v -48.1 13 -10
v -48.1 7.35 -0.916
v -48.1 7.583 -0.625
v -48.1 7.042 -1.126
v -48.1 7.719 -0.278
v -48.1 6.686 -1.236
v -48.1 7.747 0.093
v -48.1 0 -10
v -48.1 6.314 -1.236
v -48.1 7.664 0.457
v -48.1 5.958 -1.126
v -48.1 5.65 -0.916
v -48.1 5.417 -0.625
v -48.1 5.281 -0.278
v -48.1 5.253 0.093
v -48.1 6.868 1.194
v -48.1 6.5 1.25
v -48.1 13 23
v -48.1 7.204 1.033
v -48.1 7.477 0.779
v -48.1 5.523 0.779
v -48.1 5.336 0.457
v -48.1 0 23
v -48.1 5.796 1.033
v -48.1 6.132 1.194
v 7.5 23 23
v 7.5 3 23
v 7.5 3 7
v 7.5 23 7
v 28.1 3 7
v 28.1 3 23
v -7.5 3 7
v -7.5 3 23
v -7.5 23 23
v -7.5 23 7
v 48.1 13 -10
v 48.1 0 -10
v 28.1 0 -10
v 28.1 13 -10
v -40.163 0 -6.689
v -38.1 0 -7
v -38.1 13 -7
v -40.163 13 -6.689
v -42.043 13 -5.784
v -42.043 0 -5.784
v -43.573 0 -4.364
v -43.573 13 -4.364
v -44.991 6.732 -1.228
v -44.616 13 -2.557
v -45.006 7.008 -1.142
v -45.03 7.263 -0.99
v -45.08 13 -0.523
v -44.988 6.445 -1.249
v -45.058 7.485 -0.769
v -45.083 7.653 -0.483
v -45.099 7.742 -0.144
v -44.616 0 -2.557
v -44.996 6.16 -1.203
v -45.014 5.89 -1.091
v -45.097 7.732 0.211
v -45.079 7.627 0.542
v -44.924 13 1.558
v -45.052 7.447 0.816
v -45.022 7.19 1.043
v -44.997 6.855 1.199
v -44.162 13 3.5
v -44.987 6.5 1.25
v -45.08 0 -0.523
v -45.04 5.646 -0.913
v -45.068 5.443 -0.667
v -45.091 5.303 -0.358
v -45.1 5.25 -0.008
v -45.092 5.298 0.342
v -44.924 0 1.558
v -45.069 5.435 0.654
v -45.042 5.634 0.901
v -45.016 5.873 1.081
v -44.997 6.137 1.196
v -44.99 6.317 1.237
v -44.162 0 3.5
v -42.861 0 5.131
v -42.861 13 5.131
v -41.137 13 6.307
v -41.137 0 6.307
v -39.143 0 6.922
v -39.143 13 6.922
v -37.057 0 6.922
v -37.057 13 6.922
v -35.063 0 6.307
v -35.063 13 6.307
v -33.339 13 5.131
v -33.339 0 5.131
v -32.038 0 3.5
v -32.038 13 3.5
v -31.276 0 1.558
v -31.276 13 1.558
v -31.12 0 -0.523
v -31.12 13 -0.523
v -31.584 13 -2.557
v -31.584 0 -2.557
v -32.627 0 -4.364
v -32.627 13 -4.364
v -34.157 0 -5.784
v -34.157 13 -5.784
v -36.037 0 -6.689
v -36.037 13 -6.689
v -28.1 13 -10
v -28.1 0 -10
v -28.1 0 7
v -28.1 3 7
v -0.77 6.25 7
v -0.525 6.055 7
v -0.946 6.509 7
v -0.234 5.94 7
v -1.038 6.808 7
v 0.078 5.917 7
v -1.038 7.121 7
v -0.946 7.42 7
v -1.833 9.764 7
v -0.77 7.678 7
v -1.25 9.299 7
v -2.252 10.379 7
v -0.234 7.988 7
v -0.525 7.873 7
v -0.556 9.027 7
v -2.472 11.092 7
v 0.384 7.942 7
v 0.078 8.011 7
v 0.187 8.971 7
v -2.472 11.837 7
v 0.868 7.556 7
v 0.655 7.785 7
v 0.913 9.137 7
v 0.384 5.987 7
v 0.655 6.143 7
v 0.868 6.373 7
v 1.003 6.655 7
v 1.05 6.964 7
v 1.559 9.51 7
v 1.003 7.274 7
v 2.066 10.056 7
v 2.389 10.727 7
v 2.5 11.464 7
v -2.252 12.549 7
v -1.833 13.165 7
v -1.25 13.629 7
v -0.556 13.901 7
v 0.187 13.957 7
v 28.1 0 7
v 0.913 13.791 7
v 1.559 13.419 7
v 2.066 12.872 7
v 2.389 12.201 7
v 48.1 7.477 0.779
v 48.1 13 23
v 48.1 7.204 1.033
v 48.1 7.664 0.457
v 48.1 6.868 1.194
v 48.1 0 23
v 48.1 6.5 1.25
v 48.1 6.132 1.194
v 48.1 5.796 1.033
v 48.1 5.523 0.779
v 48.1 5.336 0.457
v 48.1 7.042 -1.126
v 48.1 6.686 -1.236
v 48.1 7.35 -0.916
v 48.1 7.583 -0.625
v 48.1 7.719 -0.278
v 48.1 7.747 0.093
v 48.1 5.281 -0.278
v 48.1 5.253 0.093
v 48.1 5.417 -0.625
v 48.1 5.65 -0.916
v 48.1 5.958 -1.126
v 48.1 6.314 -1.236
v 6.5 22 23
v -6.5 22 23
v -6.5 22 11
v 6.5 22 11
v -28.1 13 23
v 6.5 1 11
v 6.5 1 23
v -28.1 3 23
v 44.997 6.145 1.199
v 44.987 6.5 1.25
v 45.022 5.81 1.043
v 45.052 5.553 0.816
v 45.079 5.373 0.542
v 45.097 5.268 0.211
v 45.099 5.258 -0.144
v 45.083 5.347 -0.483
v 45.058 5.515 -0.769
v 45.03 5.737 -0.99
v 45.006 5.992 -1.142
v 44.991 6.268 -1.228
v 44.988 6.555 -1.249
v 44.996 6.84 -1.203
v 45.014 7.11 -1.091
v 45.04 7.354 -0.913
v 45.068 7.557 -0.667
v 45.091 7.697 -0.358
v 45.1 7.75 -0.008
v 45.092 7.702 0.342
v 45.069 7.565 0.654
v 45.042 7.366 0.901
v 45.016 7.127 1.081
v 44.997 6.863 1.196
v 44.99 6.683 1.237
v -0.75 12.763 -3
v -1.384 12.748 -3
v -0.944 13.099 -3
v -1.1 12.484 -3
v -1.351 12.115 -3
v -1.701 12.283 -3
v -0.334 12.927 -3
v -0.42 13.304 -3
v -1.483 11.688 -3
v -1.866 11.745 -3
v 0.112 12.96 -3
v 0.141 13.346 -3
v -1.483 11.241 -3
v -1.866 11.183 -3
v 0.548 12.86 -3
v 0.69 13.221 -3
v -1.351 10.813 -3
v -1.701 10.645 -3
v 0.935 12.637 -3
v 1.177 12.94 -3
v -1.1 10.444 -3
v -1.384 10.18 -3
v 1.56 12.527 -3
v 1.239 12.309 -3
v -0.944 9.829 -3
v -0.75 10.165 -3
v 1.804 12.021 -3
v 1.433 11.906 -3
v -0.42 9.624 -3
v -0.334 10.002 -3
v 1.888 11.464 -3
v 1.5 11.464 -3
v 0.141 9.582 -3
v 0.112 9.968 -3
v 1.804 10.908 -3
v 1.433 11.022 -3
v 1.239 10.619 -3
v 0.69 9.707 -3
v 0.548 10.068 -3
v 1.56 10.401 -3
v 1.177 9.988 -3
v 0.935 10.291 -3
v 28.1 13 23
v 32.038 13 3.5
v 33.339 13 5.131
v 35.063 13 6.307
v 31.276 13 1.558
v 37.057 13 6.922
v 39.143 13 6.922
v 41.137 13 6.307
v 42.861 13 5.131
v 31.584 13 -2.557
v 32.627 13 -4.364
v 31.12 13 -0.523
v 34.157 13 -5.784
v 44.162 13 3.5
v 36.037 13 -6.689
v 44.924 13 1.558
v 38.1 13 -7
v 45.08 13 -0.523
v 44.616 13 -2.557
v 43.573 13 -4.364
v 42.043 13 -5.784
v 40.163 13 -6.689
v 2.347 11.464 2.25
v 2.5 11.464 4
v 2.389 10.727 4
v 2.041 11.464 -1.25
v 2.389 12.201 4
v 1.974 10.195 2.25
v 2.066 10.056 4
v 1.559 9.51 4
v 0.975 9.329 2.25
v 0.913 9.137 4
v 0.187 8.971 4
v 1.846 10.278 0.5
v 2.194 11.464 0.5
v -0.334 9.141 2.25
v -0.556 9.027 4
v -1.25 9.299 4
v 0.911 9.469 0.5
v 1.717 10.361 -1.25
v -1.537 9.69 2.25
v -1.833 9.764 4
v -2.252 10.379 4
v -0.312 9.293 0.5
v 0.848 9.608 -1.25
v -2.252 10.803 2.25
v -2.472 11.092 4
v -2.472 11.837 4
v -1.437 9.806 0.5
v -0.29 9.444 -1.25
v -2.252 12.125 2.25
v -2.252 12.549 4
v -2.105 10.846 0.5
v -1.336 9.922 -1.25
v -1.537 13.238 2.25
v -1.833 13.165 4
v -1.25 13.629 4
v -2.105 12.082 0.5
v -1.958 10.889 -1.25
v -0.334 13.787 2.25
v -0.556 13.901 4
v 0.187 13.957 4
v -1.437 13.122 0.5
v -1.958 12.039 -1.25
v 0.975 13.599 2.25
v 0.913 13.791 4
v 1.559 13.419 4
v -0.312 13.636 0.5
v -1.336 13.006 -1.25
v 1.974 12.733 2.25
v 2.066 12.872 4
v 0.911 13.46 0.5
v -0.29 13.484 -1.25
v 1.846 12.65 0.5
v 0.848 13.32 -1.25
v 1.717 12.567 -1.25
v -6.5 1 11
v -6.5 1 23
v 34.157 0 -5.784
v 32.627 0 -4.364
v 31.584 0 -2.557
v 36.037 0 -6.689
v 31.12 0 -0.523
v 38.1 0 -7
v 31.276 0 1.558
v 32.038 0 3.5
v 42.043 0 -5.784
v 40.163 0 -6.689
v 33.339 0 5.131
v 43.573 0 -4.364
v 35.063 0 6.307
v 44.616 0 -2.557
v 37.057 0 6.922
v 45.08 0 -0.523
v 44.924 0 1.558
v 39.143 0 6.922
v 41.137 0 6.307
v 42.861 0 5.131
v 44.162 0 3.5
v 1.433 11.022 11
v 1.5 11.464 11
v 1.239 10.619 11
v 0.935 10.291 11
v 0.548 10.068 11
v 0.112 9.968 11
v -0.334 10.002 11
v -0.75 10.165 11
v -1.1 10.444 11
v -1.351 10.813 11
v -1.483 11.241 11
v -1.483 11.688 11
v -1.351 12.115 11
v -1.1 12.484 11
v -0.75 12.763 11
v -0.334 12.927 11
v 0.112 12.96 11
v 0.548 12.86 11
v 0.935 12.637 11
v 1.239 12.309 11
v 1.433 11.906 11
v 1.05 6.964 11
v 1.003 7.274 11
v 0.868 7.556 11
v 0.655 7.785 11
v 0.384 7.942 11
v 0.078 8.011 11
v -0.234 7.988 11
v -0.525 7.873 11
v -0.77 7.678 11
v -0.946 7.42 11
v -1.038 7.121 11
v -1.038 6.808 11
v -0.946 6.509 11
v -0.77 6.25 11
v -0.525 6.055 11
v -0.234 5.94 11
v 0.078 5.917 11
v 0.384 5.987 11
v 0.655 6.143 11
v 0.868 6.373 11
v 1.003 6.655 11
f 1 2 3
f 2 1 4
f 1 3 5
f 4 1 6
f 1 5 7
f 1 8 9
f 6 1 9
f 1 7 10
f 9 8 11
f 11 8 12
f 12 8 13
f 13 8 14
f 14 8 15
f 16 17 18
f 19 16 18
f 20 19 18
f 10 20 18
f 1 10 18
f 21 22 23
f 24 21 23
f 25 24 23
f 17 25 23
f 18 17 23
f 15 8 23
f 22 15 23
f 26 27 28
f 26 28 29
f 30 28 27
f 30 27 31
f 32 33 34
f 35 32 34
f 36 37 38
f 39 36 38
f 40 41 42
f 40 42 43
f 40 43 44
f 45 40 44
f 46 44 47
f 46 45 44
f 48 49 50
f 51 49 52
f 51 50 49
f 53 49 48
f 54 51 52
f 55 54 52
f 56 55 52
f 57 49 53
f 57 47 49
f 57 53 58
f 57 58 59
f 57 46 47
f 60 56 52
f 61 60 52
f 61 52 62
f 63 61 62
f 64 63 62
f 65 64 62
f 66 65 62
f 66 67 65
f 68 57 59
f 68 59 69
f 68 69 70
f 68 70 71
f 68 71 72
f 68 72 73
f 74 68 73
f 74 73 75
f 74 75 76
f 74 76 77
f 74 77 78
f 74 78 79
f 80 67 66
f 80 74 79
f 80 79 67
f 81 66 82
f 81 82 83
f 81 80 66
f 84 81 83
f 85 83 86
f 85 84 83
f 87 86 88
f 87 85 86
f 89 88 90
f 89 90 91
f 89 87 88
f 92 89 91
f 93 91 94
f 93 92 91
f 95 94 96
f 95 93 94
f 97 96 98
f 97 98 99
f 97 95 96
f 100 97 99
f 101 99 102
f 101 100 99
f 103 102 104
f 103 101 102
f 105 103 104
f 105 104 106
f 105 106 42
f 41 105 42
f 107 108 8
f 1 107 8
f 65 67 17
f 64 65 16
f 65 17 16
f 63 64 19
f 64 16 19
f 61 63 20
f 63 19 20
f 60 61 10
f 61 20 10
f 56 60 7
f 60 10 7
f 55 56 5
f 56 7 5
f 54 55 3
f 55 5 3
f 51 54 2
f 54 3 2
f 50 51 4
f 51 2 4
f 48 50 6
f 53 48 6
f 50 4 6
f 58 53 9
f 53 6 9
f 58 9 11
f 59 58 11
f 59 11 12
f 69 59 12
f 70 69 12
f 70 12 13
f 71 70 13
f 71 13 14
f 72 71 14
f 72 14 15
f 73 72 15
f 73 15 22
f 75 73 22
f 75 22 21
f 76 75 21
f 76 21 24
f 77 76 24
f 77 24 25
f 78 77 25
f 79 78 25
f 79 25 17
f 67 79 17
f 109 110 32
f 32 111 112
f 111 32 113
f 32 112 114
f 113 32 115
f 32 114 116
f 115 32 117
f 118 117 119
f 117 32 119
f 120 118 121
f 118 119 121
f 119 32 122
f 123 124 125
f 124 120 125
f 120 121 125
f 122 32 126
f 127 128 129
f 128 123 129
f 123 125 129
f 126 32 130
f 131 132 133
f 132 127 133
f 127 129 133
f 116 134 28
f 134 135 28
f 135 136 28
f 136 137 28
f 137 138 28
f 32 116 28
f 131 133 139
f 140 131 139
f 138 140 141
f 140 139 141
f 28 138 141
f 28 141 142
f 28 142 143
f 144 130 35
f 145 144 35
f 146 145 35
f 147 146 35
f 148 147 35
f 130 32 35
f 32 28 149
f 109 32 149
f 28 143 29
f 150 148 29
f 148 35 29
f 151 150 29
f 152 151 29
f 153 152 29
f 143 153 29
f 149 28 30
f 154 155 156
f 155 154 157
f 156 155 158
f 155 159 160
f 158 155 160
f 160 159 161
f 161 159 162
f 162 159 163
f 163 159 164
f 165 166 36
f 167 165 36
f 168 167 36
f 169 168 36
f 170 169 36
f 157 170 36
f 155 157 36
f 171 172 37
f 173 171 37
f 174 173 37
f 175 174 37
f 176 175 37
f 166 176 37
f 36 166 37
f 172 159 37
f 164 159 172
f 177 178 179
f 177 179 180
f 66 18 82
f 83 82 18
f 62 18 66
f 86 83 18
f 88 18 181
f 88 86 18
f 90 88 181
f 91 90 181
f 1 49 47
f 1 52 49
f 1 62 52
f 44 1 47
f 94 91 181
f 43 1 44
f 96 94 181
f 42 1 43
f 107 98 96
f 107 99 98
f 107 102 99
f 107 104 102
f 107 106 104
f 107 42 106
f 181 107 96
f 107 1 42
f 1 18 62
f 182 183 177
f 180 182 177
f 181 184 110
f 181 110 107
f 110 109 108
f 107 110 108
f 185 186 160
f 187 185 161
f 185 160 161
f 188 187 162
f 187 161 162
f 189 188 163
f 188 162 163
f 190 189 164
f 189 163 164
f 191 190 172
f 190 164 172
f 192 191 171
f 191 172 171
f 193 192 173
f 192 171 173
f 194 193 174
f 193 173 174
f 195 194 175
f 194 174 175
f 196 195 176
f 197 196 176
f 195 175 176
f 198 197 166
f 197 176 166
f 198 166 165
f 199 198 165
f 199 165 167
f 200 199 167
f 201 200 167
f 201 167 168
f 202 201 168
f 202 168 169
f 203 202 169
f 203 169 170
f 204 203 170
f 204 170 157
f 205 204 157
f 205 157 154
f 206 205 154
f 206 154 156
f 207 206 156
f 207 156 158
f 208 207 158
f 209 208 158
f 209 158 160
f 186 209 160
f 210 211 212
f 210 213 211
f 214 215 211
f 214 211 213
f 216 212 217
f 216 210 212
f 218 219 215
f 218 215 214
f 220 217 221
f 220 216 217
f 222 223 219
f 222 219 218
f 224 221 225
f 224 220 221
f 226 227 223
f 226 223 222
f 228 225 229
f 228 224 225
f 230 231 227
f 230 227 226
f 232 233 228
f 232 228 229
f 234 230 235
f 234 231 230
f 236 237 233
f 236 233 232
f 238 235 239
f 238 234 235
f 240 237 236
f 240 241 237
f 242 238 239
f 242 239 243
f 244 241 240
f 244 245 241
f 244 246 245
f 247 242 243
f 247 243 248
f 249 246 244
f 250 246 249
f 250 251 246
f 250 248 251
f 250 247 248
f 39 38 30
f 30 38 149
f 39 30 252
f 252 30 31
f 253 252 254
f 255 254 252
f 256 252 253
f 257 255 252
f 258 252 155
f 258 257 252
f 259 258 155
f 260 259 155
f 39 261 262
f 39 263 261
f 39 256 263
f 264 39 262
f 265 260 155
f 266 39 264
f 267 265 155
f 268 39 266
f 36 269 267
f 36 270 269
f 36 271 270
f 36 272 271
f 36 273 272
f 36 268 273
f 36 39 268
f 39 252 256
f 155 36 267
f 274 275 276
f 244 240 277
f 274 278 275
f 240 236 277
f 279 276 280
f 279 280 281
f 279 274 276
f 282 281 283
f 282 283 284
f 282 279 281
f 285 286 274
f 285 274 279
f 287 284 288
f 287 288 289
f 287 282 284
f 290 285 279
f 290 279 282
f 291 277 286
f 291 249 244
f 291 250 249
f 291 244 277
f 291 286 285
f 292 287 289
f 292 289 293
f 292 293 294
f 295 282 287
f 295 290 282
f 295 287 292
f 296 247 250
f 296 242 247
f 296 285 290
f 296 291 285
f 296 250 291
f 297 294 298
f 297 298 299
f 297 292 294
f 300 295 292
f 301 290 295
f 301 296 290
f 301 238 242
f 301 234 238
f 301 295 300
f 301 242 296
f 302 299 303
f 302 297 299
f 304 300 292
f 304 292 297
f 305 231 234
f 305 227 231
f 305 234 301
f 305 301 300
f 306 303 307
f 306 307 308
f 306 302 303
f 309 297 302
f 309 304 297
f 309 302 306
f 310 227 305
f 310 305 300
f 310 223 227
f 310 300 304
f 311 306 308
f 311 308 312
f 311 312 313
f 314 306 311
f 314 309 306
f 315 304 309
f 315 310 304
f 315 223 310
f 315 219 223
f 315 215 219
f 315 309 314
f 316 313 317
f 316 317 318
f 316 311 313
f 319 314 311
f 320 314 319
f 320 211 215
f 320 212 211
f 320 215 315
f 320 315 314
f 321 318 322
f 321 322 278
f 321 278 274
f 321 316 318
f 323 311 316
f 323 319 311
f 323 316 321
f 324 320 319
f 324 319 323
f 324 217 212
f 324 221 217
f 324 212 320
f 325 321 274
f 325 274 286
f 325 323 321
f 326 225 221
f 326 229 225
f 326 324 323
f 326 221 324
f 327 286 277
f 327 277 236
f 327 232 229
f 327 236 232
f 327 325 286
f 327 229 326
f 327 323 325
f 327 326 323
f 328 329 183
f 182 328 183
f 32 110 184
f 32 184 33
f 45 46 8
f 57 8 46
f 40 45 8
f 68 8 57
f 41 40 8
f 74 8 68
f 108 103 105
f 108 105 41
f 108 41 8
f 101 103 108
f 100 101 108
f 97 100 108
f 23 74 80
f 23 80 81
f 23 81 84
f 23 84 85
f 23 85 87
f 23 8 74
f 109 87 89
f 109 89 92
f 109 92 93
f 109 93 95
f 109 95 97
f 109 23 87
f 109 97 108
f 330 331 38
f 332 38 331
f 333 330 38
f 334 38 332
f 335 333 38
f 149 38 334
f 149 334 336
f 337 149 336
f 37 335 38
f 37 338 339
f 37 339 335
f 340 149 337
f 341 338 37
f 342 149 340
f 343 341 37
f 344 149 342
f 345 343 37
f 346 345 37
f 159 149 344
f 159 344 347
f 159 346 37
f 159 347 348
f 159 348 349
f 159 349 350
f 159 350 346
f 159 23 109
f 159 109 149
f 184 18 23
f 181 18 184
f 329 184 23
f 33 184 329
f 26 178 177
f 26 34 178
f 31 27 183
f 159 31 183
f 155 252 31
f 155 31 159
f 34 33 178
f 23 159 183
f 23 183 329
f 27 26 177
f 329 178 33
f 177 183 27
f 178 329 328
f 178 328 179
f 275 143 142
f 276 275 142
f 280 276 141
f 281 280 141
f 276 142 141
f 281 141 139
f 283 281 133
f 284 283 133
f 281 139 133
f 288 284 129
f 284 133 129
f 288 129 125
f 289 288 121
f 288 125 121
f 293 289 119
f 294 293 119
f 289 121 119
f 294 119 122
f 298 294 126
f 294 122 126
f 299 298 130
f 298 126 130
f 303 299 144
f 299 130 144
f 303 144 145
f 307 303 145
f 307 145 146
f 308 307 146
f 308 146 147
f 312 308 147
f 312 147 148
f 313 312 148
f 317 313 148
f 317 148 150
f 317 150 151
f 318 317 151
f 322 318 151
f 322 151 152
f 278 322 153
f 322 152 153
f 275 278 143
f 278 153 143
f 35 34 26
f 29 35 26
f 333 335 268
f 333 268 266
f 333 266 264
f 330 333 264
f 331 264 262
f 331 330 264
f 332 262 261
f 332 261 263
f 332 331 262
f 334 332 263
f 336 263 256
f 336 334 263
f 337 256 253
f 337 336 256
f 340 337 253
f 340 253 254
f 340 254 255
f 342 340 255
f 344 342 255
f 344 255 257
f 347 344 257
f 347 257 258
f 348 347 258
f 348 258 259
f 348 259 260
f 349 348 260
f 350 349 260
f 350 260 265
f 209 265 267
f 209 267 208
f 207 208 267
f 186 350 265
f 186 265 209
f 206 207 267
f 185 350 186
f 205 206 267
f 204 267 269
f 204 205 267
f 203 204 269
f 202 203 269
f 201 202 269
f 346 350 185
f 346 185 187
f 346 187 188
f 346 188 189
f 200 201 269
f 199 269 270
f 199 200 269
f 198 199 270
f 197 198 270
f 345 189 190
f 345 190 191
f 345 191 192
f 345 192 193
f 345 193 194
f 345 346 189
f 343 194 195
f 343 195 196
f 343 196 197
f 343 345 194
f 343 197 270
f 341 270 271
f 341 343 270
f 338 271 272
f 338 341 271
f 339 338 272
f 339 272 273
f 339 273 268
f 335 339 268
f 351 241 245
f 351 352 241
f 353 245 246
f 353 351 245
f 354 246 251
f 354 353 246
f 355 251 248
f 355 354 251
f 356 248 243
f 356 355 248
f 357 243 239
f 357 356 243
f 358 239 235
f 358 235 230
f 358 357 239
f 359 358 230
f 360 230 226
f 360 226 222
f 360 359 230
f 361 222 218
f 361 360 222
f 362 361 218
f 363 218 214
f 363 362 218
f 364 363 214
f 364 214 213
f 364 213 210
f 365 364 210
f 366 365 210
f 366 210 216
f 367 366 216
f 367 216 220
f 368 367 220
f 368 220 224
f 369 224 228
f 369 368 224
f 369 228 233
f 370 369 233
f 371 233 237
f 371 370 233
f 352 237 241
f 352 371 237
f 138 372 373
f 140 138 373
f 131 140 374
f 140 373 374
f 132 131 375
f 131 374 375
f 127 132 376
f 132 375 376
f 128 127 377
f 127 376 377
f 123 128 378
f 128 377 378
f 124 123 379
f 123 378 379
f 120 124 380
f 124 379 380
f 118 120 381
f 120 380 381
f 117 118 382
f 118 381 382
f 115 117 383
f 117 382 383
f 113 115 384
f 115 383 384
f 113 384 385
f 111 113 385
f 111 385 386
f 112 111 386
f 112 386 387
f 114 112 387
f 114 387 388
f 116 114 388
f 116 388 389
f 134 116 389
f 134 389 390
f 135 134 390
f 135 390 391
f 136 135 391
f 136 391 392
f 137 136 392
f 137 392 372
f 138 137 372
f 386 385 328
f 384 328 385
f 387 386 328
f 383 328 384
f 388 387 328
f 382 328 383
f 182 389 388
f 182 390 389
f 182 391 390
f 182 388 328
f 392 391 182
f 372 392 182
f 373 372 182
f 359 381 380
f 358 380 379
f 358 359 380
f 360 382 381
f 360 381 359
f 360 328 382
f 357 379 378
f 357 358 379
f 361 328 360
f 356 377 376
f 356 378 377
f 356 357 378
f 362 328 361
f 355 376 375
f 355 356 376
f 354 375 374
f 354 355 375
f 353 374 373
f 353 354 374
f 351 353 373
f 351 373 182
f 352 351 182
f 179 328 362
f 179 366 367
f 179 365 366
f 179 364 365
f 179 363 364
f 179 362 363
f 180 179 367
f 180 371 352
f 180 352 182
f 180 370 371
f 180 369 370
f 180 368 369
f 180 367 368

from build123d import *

# Parameters (mm, degrees)
SKETCH1_R               = 7
BOSS_EXTRUDE1_DEPTH     = 13
SKETCH2_W               = 56.2
SKETCH2_H               = 16
CUT_EXTRUDE1_DEPTH      = 10
CUT_EXTRUDE2_REACH      = 56.246
SKETCH3_W               = 15
SKETCH3_H               = 16
SKETCH4_W               = 15
SKETCH4_H               = 23
BOSS_EXTRUDE2_DEPTH     = 16
SKETCH5_W               = 13
SKETCH5_H               = 21
CUT_EXTRUDE3_DEPTH      = 12
CUT_EXTRUDE4_REACH      = 59.303
SKETCH6_R               = 1.5
SKETCH6_R_2             = 1.05
SKETCH7_R               = 2.5
SKETCH7_R_2             = 1.5
BOSS_EXTRUDE3_DEPTH     = 10
CHAMFER1_SIZE           = 7
CHAMFER1_SIZE2          = 0.612420645
CUT_EXTRUDE5_REACH      = 103.55
CUT_EXTRUDE5_END_RADIUS = 7
SKETCH8_R               = 1.25
CUT_EXTRUDE6_REACH      = 103.55
CUT_EXTRUDE6_END_RADIUS = 7
SKETCH9_R               = 1.25


with BuildPart() as part:
    # Sketch1 → Boss-Extrude1 (new body)
    with BuildSketch(Plane(origin=(0, 0, 0), x_dir=(1, 0, 0), z_dir=(0, 1, 0))):
        Polygon((-28.1, -7), (-28.1, 10), (-48.1, 10), (-48.1, -23), (-28.1, -23), (28.1, -23), (48.1, -23), (48.1, 10), (28.1, 10), (28.1, -7), align=None)
        with Locations(Location((-38.1, 0, 0), (0, 0, 90))):
            Circle(SKETCH1_R, mode=Mode.SUBTRACT)
        with Locations(Location((38.1, 0, 0), (0, 0, 90))):
            Circle(SKETCH1_R, mode=Mode.SUBTRACT)
    extrude(amount=BOSS_EXTRUDE1_DEPTH)

    # Sketch2 → Cut-Extrude1 (cut)
    with BuildSketch(Plane(origin=(0, 13, 0), x_dir=(1, 0, 0), z_dir=(0, 1, 0))):
        with Locations((0, -15)):
            Rectangle(SKETCH2_W, SKETCH2_H)
    extrude(amount=-CUT_EXTRUDE1_DEPTH, mode=Mode.SUBTRACT)

    # Sketch3 → Cut-Extrude2 (cut, up to next)
    with BuildSketch(Plane(origin=(0, 3, 0), x_dir=(1, 0, 0), z_dir=(0, 1, 0)), mode=Mode.PRIVATE) as cut_extrude2_sk1:
        with Locations((0, -15)):
            Rectangle(SKETCH3_W, SKETCH3_H)
    cut_extrude2_tool1 = extrude(cut_extrude2_sk1.sketch, amount=-CUT_EXTRUDE2_REACH, mode=Mode.PRIVATE) & part.part
    add(cut_extrude2_tool1.solids().sort_by_distance((0, 3, 15))[0], mode=Mode.SUBTRACT)


with BuildPart() as cut_extrude2_piece_1:
    # of the separate pieces the step leaves, piece 1, a body of its own (cut_extrude2_pieces)
    add(part.part.solids().sort_by_distance((28.1, 0, 7))[0])



with BuildPart() as cut_extrude2_piece_2:
    # of the separate pieces the step leaves, piece 2, a body of its own (cut_extrude2_pieces)
    add(part.part.solids().sort_by_distance((-28.1, 0, 7))[0])


with BuildPart() as cut_extrude2_piece_1_1:
    add(cut_extrude2_piece_1.part)

    add(cut_extrude2_piece_2.part)  # Boss-Extrude2 merges Cut-Extrude2 piece 2
    # Sketch4 → Boss-Extrude2 (add)
    with BuildSketch(Plane.XY.offset(23)):
        with Locations((0, 11.5)):
            Rectangle(SKETCH4_W, SKETCH4_H)
    extrude(amount=-BOSS_EXTRUDE2_DEPTH)

    # Sketch5 → Cut-Extrude3 (cut)
    with BuildSketch(Plane.XY.offset(23)):
        with Locations((0, 11.5)):
            Rectangle(SKETCH5_W, SKETCH5_H)
    extrude(amount=-CUT_EXTRUDE3_DEPTH, mode=Mode.SUBTRACT)

    # Sketch6 → Cut-Extrude4 (cut, up to next)
    with BuildSketch(Plane.XY.offset(11), mode=Mode.PRIVATE) as cut_extrude4_sk1:
        with Locations((0, 11.464154045)):
            Circle(SKETCH6_R)
    cut_extrude4_tool1 = extrude(cut_extrude4_sk1.sketch, amount=-CUT_EXTRUDE4_REACH, mode=Mode.PRIVATE) & cut_extrude2_piece_1_1.part
    # Sketch6 → Cut-Extrude4 (cut, up to next)
    with BuildSketch(Plane.XY.offset(11), mode=Mode.PRIVATE) as cut_extrude4_sk2:
        with Locations((0, 6.964154045)):
            Circle(SKETCH6_R_2)
    cut_extrude4_tool2 = extrude(cut_extrude4_sk2.sketch, amount=-CUT_EXTRUDE4_REACH, mode=Mode.PRIVATE) & cut_extrude2_piece_1_1.part
    add(cut_extrude4_tool1.solids().sort_by_distance((0, 11.464154, 11))[0], mode=Mode.SUBTRACT)
    add(cut_extrude4_tool2.solids().sort_by_distance((0, 6.964154, 11))[0], mode=Mode.SUBTRACT)

    # Sketch7 → Boss-Extrude3 (add)
    with BuildSketch(Plane(origin=(0, 0, 7), x_dir=(-1, 0, 0), z_dir=(0, 0, -1))):
        with Locations(Location((0, 11.464154045, 0), (0, 0, 180))):
            Circle(SKETCH7_R)
        with Locations(Location((0, 11.464154045, 0), (0, 0, 180))):
            Circle(SKETCH7_R_2, mode=Mode.SUBTRACT)
    extrude(amount=BOSS_EXTRUDE3_DEPTH)

    # Chamfer1
    chamfer1_edges = [cut_extrude2_piece_1_1.edges().sort_by_distance(p)[0] for p in [
        (-2.5, 11.464154045, -3),
    ]]
    chamfer1_side = [cut_extrude2_piece_1_1.faces().sort_by_distance(p)[0] for p in [
        (-2.5, 11.464154045, 2),
    ]]
    chamfer(chamfer1_edges, length=CHAMFER1_SIZE, length2=CHAMFER1_SIZE2, reference=chamfer1_side[0])

    # Cut-Extrude5: up to this cylinder (the profile starts outside it)
    cut_extrude5_end = Plane(origin=(-38.1, 6.5, 0), z_dir=(0, -1, 0)) * Cylinder(CUT_EXTRUDE5_END_RADIUS, 222.1, mode=Mode.PRIVATE)
    # Sketch8 → Cut-Extrude5 (cut, up to the surface)
    with BuildSketch(Plane.ZY.offset(48.1), mode=Mode.PRIVATE) as cut_extrude5_sk1:
        with Locations((0, 6.5)):
            Circle(SKETCH8_R)
    cut_extrude5_tool1 = extrude(cut_extrude5_sk1.sketch, amount=-CUT_EXTRUDE5_REACH, mode=Mode.PRIVATE) - cut_extrude5_end
    add(cut_extrude5_tool1.solids().sort_by_distance((-48.1, 6.5, 0))[0], mode=Mode.SUBTRACT)

    # Cut-Extrude6: up to this cylinder (the profile starts outside it)
    cut_extrude6_end = Plane(origin=(38.1, 6.5, 0), z_dir=(0, -1, 0)) * Cylinder(CUT_EXTRUDE6_END_RADIUS, 222.1, mode=Mode.PRIVATE)
    # Sketch9 → Cut-Extrude6 (cut, up to the surface)
    with BuildSketch(Plane(origin=(48.1, 0, 0), x_dir=(0, 0, -1), z_dir=(1, 0, 0)), mode=Mode.PRIVATE) as cut_extrude6_sk1:
        with Locations(Location((0, 6.5, 0), (0, 0, 180))):
            Circle(SKETCH9_R)
    cut_extrude6_tool1 = extrude(cut_extrude6_sk1.sketch, amount=-CUT_EXTRUDE6_REACH, mode=Mode.PRIVATE) - cut_extrude6_end
    add(cut_extrude6_tool1.solids().sort_by_distance((48.1, 6.5, 0))[0], mode=Mode.SUBTRACT)


solid = cut_extrude2_piece_1_1.part
